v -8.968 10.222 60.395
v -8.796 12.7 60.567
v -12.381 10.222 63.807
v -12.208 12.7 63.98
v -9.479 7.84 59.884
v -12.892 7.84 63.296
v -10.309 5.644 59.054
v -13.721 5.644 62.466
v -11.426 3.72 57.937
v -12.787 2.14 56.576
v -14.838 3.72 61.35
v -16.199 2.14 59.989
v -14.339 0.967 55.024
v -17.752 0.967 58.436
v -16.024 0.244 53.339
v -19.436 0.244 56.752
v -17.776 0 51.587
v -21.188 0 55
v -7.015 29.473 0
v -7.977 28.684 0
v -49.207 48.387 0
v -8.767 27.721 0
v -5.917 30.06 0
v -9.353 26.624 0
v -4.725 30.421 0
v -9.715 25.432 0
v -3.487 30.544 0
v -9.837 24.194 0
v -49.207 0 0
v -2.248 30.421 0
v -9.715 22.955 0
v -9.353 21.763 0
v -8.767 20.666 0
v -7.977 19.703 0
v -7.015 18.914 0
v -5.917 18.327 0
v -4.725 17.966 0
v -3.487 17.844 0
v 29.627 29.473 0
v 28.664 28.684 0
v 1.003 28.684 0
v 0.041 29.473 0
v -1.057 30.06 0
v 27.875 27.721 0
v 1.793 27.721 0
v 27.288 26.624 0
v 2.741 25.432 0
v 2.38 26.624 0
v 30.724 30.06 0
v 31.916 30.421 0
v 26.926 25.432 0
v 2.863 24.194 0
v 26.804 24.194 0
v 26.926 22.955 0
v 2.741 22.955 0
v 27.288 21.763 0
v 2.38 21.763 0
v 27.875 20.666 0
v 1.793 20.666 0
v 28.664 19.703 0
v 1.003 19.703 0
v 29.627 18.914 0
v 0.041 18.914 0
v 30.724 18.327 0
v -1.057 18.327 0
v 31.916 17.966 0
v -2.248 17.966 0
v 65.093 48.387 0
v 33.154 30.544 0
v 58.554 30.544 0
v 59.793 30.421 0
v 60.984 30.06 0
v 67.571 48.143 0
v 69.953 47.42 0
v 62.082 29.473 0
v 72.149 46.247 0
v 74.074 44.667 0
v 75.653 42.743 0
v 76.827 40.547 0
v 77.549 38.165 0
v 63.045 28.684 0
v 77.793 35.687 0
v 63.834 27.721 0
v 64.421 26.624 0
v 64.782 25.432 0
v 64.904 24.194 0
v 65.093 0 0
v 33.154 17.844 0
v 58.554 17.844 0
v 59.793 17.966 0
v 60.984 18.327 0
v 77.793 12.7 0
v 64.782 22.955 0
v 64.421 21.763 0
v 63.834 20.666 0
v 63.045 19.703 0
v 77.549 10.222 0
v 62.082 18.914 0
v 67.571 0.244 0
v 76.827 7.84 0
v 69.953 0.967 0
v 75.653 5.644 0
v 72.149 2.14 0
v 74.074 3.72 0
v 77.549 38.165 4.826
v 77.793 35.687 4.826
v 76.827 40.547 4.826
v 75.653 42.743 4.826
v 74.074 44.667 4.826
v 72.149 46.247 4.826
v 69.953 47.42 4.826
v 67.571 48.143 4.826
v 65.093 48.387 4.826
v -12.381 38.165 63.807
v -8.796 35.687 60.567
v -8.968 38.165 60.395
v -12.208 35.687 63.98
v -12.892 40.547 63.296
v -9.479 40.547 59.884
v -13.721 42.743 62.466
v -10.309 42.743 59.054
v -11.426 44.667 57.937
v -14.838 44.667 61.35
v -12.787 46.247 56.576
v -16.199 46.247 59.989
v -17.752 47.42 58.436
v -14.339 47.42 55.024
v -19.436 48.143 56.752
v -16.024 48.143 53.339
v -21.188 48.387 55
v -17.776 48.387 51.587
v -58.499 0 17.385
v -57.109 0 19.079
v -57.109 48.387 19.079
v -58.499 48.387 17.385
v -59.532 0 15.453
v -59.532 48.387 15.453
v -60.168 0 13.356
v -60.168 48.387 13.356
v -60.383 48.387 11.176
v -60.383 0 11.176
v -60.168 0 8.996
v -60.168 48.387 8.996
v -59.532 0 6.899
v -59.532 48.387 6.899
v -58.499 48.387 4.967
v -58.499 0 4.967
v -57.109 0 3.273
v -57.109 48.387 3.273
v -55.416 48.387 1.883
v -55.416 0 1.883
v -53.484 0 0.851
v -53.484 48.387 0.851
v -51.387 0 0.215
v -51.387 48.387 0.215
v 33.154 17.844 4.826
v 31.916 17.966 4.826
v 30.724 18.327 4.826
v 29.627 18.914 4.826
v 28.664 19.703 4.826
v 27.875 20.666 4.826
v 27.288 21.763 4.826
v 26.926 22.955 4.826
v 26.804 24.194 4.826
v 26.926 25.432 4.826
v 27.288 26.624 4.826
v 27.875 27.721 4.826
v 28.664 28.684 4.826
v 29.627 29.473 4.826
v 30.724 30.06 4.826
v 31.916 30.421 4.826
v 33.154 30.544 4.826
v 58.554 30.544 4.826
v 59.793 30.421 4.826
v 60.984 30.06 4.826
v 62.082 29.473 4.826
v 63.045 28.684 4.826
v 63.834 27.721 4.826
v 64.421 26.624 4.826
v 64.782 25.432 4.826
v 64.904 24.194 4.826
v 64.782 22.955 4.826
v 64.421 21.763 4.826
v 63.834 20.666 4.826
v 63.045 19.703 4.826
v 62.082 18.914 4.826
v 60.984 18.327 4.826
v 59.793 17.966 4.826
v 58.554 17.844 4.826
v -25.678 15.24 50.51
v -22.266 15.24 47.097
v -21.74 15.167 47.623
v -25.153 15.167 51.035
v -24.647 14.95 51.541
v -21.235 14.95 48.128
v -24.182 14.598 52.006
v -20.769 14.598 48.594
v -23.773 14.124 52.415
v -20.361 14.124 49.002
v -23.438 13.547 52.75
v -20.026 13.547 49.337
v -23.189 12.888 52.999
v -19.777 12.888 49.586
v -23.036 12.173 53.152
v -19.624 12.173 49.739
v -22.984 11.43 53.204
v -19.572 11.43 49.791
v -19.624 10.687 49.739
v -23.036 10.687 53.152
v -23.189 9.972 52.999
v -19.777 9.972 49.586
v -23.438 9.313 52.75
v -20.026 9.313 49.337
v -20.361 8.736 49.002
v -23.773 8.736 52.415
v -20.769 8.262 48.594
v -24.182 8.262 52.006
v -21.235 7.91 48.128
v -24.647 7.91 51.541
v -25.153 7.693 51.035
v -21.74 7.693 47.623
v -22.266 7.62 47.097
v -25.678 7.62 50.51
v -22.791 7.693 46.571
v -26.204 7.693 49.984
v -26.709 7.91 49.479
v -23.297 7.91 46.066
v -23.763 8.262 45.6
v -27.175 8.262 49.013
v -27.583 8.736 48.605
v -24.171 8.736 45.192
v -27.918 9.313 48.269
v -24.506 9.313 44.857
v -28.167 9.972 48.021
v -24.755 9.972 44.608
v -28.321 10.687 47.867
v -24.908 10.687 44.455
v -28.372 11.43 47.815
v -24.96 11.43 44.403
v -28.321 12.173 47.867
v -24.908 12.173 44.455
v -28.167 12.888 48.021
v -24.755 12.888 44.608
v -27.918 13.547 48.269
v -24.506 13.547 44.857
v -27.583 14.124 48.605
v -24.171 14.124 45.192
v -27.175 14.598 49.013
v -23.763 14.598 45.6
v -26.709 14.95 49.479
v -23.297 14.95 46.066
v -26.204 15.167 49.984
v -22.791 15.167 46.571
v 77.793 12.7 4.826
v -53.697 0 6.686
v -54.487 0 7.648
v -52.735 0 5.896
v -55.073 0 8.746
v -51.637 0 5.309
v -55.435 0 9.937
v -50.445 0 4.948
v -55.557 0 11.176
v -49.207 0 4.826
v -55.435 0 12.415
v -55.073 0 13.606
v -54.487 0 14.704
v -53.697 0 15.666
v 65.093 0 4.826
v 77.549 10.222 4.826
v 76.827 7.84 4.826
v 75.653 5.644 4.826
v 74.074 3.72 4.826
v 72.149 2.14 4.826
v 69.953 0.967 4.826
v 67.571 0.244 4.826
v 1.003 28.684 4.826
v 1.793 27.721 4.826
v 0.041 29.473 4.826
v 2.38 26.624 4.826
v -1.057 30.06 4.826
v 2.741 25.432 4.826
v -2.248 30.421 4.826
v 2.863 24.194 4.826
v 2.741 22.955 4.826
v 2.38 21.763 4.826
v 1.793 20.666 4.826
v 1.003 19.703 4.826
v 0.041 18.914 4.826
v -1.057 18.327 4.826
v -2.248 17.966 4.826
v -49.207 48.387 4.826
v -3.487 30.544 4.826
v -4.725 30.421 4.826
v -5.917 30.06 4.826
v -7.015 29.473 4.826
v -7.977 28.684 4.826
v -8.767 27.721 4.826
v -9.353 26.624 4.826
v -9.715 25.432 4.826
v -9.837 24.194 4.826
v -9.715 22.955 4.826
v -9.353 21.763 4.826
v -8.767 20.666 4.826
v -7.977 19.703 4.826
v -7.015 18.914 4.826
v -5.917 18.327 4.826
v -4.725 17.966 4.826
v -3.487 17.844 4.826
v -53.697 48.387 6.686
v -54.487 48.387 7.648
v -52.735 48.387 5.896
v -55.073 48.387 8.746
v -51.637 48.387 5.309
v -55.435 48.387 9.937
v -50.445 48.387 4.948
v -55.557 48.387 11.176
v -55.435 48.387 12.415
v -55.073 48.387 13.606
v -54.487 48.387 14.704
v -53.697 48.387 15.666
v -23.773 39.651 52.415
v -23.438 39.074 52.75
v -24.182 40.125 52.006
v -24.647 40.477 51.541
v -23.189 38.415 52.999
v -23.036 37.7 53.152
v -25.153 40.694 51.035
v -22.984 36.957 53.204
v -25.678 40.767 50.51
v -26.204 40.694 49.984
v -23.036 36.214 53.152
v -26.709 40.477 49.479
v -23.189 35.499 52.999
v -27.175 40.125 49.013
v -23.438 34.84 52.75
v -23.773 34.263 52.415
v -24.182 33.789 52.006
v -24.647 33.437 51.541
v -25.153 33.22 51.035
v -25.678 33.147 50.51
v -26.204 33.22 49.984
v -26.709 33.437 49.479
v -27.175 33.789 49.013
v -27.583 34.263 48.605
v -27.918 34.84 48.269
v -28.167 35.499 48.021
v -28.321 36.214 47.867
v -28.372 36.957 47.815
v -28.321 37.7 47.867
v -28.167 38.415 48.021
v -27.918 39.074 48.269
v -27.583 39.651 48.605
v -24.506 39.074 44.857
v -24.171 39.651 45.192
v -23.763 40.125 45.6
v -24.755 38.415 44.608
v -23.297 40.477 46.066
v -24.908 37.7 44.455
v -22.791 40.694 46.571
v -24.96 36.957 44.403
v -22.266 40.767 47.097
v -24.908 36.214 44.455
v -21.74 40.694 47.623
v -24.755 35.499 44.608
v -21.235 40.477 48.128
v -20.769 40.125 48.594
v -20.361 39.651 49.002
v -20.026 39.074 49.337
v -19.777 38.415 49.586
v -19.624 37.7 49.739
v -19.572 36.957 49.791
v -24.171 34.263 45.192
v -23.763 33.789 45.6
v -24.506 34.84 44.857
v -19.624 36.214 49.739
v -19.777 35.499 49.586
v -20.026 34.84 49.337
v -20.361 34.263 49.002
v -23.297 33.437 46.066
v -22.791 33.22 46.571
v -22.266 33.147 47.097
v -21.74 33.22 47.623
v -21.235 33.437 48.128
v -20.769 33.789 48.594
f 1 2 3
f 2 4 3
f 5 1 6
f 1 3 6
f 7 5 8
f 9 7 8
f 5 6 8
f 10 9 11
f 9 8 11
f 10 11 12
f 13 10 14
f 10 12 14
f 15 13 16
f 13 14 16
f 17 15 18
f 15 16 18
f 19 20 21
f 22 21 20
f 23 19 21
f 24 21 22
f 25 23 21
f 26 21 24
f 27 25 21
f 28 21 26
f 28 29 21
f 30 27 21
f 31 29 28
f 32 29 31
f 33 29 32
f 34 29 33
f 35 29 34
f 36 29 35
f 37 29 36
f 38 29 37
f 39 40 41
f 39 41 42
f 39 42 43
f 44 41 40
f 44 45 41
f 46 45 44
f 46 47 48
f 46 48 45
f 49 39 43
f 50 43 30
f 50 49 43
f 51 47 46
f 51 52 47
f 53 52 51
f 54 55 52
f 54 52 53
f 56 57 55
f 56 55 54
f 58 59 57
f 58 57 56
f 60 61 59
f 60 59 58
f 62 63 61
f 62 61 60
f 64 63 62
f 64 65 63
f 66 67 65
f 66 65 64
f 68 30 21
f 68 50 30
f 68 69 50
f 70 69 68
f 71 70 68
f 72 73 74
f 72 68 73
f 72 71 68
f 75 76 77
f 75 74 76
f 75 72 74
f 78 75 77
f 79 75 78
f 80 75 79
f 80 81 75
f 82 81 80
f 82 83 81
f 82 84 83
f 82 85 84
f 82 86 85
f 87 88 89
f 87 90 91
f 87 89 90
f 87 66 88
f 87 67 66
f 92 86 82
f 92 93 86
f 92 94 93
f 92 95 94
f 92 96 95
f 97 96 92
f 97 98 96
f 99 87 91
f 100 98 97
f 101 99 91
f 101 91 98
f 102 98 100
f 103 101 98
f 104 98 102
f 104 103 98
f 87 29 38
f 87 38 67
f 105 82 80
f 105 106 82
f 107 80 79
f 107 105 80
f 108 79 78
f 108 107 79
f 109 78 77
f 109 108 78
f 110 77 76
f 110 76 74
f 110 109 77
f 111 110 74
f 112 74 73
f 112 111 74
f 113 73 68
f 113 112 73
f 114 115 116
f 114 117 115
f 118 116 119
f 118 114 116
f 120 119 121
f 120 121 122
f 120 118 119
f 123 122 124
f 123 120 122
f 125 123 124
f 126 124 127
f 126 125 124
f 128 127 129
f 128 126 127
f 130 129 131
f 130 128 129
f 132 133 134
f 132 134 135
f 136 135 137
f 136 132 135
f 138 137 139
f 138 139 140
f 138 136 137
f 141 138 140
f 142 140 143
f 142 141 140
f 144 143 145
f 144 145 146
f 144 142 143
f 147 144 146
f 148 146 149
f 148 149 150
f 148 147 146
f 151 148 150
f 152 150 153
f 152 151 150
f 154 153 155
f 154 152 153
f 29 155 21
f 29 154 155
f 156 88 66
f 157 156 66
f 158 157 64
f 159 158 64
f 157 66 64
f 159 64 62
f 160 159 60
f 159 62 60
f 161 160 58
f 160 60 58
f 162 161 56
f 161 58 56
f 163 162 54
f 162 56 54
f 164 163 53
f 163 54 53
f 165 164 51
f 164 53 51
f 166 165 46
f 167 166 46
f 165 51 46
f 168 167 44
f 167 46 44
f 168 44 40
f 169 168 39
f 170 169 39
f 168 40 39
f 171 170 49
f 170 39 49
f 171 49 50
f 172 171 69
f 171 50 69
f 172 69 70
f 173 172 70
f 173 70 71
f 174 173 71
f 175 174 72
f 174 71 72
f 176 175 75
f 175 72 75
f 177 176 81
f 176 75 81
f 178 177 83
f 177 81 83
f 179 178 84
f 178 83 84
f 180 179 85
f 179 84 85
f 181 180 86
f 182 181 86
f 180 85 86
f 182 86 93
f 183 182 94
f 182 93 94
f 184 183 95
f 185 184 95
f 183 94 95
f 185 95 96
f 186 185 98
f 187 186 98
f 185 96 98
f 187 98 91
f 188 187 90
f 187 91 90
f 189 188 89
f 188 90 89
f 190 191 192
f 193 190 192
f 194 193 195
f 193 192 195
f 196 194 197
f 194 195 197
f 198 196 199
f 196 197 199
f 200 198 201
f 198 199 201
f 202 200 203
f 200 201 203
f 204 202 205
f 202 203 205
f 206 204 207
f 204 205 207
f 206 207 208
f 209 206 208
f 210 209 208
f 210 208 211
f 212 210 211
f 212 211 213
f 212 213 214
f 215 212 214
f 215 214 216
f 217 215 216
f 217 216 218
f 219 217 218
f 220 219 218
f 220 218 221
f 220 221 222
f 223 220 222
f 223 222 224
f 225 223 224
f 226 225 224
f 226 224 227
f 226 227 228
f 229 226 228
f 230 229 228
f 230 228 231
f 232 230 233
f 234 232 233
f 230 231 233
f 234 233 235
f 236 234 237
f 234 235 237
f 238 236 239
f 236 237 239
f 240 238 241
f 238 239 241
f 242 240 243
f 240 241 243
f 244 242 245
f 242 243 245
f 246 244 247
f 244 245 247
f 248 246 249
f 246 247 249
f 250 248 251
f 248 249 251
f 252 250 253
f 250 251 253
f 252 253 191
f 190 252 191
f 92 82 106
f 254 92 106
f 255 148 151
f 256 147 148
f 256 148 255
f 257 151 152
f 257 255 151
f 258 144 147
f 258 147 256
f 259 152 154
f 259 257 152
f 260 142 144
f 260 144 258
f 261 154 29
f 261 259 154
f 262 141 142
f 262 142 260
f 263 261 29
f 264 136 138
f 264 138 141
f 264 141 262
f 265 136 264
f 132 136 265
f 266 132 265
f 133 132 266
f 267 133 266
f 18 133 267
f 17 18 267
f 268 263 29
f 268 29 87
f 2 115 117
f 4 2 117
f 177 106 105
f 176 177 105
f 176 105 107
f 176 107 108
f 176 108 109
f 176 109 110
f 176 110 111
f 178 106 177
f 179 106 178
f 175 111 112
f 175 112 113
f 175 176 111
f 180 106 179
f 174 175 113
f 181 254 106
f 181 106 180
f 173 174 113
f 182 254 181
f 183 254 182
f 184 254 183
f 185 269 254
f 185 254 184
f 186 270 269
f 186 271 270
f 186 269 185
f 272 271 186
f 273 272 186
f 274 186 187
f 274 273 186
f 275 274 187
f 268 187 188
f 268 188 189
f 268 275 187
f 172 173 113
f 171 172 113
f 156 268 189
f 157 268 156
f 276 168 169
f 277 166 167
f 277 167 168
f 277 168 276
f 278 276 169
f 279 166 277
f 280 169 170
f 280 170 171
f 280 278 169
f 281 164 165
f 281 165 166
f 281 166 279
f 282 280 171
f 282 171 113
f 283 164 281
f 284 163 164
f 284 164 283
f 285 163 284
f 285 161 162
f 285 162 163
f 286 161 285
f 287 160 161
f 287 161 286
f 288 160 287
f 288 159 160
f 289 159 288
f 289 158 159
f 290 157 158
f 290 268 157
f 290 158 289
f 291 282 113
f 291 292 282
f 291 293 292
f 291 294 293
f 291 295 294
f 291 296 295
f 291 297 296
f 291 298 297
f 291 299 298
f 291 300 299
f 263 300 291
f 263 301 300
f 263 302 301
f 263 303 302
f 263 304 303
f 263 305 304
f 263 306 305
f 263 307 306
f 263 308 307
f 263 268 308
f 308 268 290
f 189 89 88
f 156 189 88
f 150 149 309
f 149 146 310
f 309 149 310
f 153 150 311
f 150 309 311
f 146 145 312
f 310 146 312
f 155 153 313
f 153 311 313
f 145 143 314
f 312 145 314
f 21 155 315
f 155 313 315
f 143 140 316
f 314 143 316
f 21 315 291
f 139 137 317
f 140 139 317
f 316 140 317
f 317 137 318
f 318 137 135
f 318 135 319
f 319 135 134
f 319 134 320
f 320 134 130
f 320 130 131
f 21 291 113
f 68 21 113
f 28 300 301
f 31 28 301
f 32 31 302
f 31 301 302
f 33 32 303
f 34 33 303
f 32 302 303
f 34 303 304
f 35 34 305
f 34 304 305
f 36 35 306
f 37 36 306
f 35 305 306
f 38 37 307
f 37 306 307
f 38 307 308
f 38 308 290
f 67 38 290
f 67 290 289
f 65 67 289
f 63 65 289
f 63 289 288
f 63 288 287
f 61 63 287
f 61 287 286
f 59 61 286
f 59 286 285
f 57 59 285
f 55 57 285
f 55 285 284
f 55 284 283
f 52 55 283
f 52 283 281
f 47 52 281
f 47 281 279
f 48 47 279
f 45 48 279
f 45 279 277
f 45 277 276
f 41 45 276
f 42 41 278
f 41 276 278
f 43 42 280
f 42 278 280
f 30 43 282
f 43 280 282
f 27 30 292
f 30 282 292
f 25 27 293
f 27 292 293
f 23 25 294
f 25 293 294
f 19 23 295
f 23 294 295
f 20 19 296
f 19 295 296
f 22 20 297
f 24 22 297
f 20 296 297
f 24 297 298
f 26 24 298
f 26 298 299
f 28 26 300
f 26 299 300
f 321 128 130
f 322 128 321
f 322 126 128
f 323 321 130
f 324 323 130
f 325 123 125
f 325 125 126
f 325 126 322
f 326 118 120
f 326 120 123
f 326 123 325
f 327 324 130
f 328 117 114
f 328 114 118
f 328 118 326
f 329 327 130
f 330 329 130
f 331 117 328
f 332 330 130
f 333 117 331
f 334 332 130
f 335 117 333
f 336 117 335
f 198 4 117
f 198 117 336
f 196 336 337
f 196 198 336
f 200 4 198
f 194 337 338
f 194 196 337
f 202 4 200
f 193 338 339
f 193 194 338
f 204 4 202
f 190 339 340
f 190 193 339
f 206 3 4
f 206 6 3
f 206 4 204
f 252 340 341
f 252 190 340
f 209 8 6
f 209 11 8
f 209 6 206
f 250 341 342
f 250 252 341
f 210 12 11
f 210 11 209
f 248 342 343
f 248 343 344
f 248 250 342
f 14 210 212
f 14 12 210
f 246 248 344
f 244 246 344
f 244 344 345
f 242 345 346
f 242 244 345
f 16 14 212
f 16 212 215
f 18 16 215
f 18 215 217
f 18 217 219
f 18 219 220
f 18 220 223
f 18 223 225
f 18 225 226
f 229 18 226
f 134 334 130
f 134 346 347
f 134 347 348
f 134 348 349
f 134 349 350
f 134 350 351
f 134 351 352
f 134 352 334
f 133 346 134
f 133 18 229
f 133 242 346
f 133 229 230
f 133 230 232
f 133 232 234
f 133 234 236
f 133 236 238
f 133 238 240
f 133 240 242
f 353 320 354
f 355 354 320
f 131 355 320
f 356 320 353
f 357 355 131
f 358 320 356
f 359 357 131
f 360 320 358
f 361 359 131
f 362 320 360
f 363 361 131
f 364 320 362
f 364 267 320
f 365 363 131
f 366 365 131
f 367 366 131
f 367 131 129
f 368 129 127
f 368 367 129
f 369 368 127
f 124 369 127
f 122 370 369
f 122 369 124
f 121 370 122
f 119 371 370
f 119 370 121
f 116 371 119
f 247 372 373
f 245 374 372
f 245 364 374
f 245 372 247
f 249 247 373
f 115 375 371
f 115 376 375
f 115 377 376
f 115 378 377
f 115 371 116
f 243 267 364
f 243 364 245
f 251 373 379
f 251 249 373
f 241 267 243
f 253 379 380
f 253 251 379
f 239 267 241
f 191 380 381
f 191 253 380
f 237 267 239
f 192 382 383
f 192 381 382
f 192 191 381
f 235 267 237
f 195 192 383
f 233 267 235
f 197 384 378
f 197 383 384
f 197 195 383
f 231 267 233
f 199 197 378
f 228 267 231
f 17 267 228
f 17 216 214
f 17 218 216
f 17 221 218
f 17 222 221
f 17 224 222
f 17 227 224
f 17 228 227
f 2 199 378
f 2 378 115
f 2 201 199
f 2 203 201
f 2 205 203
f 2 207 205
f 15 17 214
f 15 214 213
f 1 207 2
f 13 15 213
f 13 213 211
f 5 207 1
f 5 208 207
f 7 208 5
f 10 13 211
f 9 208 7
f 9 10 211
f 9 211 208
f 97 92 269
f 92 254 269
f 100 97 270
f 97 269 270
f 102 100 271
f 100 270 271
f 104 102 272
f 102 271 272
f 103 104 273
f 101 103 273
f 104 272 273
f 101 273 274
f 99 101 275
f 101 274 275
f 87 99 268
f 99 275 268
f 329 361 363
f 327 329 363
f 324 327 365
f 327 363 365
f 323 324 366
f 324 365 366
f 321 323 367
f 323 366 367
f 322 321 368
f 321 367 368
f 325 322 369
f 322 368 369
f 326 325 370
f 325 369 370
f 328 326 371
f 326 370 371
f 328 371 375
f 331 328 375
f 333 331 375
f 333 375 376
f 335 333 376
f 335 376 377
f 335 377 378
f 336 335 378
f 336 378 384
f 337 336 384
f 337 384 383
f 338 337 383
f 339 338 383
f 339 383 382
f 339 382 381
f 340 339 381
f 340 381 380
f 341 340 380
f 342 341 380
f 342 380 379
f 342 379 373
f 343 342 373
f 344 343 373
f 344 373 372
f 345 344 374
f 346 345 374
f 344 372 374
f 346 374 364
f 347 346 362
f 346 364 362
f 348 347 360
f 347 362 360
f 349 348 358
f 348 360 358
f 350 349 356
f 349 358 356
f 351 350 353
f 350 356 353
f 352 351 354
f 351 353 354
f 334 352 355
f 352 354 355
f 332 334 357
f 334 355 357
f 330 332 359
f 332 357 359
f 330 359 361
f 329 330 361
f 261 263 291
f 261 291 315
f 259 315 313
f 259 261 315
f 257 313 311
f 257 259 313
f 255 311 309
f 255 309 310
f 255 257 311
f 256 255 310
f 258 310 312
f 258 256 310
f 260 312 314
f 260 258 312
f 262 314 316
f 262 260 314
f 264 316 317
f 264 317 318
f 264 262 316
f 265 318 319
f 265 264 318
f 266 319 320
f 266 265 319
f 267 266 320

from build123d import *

# Parameters (mm, degrees)
F1_DEPTH = 48.387
F2_R     = 12.7
F4_D     = 7.62
F4_DEPTH = 12.7
F6_D     = 12.7
F6_DEPTH = 12.7
F7_DEPTH = 63.980906


with BuildPart() as f1:
    # F0 (on Front) → F1 (new body)
    with BuildSketch(Plane.XZ):
        with BuildLine():
            Line((-49.206674, 0), (77.793326, 0))
            Line((77.793326, 0), (77.793327, 4.826))
            Line((77.793327, 4.826), (-49.206673, 4.826))
            ThreePointArc((-49.206673, 4.826), (-55.073309, 8.74596), (-53.696802, 15.666128))
            Line((-53.696802, 15.666128), (-8.795522, 60.567409))
            Line((-8.795522, 60.567409), (-12.208019, 63.979906))
            Line((-12.208019, 63.979906), (-57.1093, 19.078625))
            ThreePointArc((-57.1093, 19.078625), (-59.531952, 6.89913), (-49.206674, 0))
        make_face()
    extrude(amount=-F1_DEPTH)

    # F2
    f2_edges = [f1.edges().sort_by_distance(p)[0] for p in [
        (-10.50177, 48.387, 62.273657),
        (-10.50177, 0, 62.273657),
        (77.793327, 0, 2.413),
        (77.793327, 48.387, 2.413),
    ]]
    fillet(f2_edges, radius=F2_R)

    # F4
    with Locations(Plane(origin=(-38.093962, 0, 38.093962), x_dir=(0, -1, 0), z_dir=(-0.707107, 0, 0.707107))):
        with Locations((-36.957, 17.558252), (-11.43, 17.558252)):
            Hole(F4_D / 2, depth=F4_DEPTH)

    # F6
    with Locations(Plane(origin=(0, 0, 0), x_dir=(1, 0, 0), z_dir=(0, 0, -1))):
        with Locations((-3.486674, -24.1935)):
            Hole(F6_D / 2, depth=F6_DEPTH)

    # F5 (on face) → F7 (cut, through all)
    with BuildSketch(Plane(origin=(0, 0, 0), x_dir=(1, 0, 0), z_dir=(0, 0, -1))):
        with BuildLine():
            Line((58.554438, -17.8435), (33.154438, -17.8435))
            ThreePointArc((33.154438, -17.8435), (26.804438, -24.1935), (33.154438, -30.5435))
            Line((33.154438, -30.5435), (58.554438, -30.5435))
            ThreePointArc((58.554438, -30.5435), (64.904438, -24.1935), (58.554438, -17.8435))
        make_face()
    extrude(amount=-F7_DEPTH, mode=Mode.SUBTRACT)


solid = f1.part
